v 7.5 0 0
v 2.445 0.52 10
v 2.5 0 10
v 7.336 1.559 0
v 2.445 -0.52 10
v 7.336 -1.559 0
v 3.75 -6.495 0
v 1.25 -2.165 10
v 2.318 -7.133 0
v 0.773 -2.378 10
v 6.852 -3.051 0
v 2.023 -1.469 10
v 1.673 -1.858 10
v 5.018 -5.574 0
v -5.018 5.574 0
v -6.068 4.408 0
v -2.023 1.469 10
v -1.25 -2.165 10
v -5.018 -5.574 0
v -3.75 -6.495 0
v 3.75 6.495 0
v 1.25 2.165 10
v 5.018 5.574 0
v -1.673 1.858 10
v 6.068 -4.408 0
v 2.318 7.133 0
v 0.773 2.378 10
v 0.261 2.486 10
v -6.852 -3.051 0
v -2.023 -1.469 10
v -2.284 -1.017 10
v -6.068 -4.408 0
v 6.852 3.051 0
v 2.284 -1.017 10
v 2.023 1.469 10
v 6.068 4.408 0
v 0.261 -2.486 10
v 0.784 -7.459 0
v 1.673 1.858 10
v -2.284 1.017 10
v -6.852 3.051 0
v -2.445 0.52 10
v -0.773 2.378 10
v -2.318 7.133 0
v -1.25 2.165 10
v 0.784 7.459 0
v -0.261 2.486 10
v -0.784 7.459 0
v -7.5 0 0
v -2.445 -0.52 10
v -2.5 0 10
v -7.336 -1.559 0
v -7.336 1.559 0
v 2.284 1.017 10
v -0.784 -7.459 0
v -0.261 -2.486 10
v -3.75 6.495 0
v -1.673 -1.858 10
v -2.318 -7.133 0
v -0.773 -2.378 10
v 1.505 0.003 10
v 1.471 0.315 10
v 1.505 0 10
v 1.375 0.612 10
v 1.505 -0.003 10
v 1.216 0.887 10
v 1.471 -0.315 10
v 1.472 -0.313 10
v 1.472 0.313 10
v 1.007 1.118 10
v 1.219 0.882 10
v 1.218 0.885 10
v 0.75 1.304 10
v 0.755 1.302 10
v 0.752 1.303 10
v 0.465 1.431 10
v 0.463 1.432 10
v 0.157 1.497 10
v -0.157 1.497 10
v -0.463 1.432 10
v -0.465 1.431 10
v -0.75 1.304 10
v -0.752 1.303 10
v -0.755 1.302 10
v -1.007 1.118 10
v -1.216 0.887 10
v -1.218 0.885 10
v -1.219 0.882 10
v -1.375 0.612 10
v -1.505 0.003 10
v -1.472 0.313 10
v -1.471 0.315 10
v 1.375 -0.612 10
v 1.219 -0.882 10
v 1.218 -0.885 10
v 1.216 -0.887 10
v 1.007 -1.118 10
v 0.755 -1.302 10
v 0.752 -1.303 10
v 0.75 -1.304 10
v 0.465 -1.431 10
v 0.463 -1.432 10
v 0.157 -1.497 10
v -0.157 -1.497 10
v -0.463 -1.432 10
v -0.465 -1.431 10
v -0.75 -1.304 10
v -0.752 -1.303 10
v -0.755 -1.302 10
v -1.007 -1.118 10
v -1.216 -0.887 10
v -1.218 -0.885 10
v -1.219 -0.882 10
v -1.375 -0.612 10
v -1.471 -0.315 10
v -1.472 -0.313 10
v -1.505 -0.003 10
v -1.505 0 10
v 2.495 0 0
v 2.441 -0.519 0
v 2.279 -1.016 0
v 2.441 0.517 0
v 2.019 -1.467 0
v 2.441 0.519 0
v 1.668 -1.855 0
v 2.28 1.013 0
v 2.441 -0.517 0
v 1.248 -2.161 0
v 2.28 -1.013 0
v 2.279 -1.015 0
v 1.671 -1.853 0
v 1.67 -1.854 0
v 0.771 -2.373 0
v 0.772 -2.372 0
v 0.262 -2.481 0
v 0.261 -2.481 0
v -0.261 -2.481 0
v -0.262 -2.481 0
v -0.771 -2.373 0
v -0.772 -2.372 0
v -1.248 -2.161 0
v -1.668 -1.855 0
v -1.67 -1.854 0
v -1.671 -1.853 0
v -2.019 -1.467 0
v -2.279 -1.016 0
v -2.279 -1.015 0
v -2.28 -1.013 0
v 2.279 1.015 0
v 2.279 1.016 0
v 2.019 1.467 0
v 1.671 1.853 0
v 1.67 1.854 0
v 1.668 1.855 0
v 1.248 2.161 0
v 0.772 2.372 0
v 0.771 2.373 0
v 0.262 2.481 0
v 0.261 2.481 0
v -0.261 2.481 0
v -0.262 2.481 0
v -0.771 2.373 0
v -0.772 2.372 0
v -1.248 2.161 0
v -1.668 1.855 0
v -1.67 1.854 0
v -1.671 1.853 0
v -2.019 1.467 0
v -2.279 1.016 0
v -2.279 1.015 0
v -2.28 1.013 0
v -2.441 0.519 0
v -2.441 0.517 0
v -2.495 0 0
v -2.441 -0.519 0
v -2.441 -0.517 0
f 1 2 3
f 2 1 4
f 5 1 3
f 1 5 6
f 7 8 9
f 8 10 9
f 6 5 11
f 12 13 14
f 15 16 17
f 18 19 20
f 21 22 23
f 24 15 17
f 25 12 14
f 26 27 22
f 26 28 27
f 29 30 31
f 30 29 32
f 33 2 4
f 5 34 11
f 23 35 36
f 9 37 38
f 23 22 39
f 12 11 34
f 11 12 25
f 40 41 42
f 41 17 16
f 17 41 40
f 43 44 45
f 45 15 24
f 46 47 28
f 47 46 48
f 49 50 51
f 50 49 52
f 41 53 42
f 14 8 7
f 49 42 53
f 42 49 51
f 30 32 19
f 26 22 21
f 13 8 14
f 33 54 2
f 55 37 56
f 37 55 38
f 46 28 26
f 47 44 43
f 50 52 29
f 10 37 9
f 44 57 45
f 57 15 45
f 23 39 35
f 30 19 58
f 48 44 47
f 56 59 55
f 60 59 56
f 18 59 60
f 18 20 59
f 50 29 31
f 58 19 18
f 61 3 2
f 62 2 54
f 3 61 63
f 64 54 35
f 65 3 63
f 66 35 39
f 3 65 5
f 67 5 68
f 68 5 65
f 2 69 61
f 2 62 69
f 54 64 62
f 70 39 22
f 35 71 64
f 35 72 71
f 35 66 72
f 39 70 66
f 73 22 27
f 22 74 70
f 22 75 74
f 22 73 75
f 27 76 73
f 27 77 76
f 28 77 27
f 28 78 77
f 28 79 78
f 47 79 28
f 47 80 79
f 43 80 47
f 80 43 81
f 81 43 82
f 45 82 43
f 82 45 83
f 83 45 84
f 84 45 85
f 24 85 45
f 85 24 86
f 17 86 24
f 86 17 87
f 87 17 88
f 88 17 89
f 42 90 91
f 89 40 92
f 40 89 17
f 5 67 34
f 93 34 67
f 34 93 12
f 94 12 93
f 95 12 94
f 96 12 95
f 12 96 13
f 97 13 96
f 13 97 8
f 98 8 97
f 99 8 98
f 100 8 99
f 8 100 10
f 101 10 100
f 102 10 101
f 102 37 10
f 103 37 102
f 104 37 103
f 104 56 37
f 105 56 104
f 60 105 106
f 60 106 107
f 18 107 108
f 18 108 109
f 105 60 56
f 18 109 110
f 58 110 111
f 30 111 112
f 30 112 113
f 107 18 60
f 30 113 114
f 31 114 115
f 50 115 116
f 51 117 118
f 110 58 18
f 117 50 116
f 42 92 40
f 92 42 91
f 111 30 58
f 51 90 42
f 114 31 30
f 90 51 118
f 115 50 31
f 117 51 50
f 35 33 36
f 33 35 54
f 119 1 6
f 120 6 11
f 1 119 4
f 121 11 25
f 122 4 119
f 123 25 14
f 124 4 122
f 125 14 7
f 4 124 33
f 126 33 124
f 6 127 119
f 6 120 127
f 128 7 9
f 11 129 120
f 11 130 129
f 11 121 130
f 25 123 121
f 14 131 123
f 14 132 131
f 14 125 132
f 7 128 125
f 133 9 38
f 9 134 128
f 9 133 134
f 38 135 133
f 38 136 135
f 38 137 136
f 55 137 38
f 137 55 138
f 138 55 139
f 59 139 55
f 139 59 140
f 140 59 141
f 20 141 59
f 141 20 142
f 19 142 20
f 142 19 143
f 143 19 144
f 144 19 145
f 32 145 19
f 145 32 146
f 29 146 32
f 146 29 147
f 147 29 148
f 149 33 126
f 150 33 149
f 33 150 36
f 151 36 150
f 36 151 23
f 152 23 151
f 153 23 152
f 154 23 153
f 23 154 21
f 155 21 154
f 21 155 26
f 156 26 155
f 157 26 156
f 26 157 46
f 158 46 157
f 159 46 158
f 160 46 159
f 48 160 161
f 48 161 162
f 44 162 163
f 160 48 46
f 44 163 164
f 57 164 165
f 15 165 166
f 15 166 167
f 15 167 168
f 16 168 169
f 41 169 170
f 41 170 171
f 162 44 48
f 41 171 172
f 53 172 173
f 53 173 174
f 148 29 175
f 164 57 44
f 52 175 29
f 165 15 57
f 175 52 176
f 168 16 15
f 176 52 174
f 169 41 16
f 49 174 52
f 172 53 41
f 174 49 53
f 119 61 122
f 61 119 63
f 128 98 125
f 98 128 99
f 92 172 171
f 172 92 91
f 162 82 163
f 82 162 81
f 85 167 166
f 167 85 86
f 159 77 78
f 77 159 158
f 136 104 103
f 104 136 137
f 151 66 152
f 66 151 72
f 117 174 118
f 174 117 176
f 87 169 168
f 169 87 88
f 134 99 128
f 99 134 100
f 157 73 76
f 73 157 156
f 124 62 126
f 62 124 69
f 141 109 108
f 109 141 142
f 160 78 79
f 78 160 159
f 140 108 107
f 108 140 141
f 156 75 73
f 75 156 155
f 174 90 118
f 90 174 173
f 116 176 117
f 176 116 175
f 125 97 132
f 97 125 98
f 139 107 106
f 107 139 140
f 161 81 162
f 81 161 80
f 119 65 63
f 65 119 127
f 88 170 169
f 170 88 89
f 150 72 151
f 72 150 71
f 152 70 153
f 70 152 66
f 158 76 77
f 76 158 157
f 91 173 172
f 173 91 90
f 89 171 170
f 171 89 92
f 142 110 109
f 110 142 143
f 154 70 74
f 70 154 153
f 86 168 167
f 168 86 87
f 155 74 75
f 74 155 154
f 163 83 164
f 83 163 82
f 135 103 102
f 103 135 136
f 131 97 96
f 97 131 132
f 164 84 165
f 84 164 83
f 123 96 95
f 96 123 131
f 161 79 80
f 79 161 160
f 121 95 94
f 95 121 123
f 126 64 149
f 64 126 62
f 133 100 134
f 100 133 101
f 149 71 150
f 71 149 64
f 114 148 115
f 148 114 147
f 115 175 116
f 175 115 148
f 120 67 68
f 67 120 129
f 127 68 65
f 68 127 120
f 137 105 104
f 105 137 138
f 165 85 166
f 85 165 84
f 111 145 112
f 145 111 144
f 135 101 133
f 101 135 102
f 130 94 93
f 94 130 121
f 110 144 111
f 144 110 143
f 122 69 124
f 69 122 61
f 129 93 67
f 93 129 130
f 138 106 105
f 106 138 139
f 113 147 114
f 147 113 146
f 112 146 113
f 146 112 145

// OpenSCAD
/*

    Base Spacer Design Author: Andy Kirby, Email: andy@kirbyand.co.uk, Date: 27/12/2010
    Coner Remix for Thingiverse Customizer: George W Childs for cone module, Date: 14/7/2013.
    Licensing GPL V3 (http://www.gnu.org/licenses/quick-guide-gplv3.html).

    Script to create a customizable plastic cone or spacer, thin spacers can also be used as washers.

*/

//  3 = triangular, 4 = pyramidal

// $fn smoothness, > smoothing, 3 = triangular, 4 = pyramidal
smoother = 30; // [3:160]

// Height of Coner
conerh = 10; // [1:100]

// Hole Diameter - Bottom
holeidb = 5; // [0:100]

// Hole Diameter - Top
holeidt = 3; // [0:100]

// Coner Outer Diameter - Bottom
conerodb = 15; // [1:100]

// Coner Outer Diameter - Top
conerodt = 5; // [1:100]

coner(conerh,holeidb,holeidt,conerodb,conerodt);
//coner(10,5,3,10,5);

/* The generalized coner module */
module coner(conerh,holeidb,holeidt,conerodb,conerodt) {
   // Do not change precalculated factors
   holerb = holeidb / 2;
   holert = holeidt / 2;
   conerorb = conerodb / 2;
   conerort = conerodt / 2;
   difference() {
     // from the spacer solid
        cylinder(h=conerh, r1=conerorb, r2=conerort, center=false, $fn=smoother);
     // subtract the hole 
        translate([0,0,-.05]) cylinder(h=conerh+.1, r1=holerb, r2=holert, center=false, $fn=smoother);
	//  This is an optional hole for a screw to hold the coner in place on a rod
//#		translate([0,0,conerh/2]) rotate([0,90,0]) cylinder(r=1.6,h=conerorb*2,center=true,$fn=8);

   }
}
